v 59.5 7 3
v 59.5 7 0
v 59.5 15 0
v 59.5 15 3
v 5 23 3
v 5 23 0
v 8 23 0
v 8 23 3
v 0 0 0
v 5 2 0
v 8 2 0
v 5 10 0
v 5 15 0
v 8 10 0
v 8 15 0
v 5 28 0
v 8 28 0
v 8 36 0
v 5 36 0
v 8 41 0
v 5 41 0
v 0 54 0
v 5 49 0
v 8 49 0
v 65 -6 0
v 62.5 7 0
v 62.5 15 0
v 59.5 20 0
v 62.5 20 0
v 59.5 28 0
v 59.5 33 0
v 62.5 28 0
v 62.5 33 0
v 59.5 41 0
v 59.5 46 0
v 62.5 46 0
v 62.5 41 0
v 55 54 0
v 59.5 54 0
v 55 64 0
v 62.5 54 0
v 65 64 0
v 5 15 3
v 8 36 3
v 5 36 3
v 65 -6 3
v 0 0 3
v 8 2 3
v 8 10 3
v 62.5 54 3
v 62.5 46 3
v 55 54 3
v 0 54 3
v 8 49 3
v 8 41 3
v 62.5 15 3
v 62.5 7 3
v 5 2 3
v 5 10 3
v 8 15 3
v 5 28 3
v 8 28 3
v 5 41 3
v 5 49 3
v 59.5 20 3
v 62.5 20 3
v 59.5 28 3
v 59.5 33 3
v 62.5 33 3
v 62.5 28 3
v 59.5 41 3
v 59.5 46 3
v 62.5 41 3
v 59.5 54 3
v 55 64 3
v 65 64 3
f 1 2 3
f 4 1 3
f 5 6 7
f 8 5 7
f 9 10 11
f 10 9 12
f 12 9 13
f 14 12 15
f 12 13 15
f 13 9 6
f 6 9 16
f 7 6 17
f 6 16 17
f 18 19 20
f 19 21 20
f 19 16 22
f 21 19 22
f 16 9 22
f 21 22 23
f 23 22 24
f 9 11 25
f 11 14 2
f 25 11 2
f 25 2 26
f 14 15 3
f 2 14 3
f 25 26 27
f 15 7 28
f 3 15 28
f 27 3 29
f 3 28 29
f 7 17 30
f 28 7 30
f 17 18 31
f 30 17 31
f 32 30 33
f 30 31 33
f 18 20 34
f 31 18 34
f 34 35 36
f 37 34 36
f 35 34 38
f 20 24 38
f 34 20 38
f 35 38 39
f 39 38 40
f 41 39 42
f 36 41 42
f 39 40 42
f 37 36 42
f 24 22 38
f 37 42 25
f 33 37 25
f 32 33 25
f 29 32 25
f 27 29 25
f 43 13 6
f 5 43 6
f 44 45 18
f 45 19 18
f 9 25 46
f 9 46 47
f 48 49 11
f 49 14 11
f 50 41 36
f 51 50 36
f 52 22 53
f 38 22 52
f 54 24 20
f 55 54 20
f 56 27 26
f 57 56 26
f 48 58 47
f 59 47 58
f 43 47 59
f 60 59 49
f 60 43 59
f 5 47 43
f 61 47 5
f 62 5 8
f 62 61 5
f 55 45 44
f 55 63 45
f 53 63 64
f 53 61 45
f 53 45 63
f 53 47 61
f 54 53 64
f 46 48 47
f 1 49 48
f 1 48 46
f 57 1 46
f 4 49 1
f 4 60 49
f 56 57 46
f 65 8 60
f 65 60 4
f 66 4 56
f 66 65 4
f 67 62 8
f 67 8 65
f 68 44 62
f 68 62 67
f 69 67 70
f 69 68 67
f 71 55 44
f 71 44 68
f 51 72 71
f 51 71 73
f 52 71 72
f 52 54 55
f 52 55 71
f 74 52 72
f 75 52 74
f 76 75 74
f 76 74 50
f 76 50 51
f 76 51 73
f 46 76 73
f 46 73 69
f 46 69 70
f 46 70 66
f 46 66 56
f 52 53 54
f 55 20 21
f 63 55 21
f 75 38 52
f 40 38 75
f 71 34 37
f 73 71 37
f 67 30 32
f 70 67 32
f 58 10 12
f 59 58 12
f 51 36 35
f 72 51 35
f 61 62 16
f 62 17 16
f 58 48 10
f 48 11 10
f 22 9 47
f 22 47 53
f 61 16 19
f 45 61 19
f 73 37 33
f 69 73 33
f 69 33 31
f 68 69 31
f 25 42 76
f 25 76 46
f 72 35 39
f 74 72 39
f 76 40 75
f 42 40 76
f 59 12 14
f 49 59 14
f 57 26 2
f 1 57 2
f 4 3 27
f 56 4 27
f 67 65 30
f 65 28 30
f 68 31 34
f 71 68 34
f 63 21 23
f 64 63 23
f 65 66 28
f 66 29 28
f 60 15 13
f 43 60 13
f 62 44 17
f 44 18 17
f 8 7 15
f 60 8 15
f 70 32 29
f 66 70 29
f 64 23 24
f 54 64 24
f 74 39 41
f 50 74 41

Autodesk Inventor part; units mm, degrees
ref_plane "YZ Plane" through (0, 0, 0) normal (1, 0, 0) x (0, 1, 0)
ref_plane "XZ Plane" through (0, 0, 0) normal (0, 1, 0) x (-1, 0, 0)
ref_plane "XY Plane" through (0, 0, 0) normal (0, 0, 1) x (1, 0, 0)
sketch "Sketch1" plane through (0, 0, 0) normal (0, 0, 1) x (1, 0, 0)
  line L0 (0, 0) -> (0, 54)
  line L1 (0, 54) -> (55, 54)
  line L2 (55, 54) -> (55, 64)
  line L3 (55, 64) -> (65, 64)
  line L4 (65, 64) -> (65, -6)
  line L5 (65, -6) -> (0, 0)
  line L6 (5, 49) -> (8, 49)
  line L7 (8, 49) -> (8, 41)
  line L8 (8, 41) -> (5, 41)
  line L9 (5, 41) -> (5, 49)
  line L10 (5, 36) -> (8, 36)
  line L11 (8, 36) -> (8, 28)
  line L12 (8, 28) -> (5, 28)
  line L13 (5, 28) -> (5, 36)
  line L14 (5, 23) -> (8, 23)
  line L15 (8, 23) -> (8, 15)
  line L16 (8, 15) -> (5, 15)
  line L17 (5, 15) -> (5, 23)
  line L18 (5, 10) -> (8, 10)
  line L19 (8, 10) -> (8, 2)
  line L20 (8, 2) -> (5, 2)
  line L21 (5, 2) -> (5, 10)
  line L22 (59.5, 54) -> (62.5, 54)
  line L23 (62.5, 54) -> (62.5, 46)
  line L24 (62.5, 46) -> (59.5, 46)
  line L25 (59.5, 46) -> (59.5, 54)
  line L26 (59.5, 41) -> (62.5, 41)
  line L27 (62.5, 41) -> (62.5, 33)
  line L28 (62.5, 33) -> (59.5, 33)
  line L29 (59.5, 33) -> (59.5, 41)
  line L30 (59.5, 28) -> (62.5, 28)
  line L31 (62.5, 28) -> (62.5, 20)
  line L32 (62.5, 20) -> (59.5, 20)
  line L33 (59.5, 20) -> (59.5, 28)
  line L34 (59.5, 15) -> (62.5, 15)
  line L35 (62.5, 15) -> (62.5, 7)
  line L36 (62.5, 7) -> (59.5, 7)
  line L37 (59.5, 7) -> (59.5, 15)
  point P0 (6.5, 49)
  point P1 (6.5, 36)
  point P2 (6.5, 23)
  point P3 (6.5, 10)
  point P4 (6.5, 41)
  point P5 (6.5, 28)
  point P6 (6.5, 15)
  point P7 (5, 6)
  point P8 (61, 54)
  point P9 (61, 41)
  point P10 (61, 28)
  point P11 (61, 15)
  point P12 (61, 46)
  point P13 (61, 33)
  point P14 (61, 20)
  point P15 (59.5, 11)
  point P16 (60, 64)
  point P17 (62.5, 37)
  dimension "d0" = 54
  dimension "d1" = 55
  dimension "d2" = 10
  dimension "d3" = 10
  dimension "d4" = 70
  dimension "d5" = 3
  dimension "d6" = 8
  dimension "d7" = 5
  dimension "d8" = 5
  dimension "d9" = 3
  dimension "d10" = 8
  dimension "d11" = 3
  dimension "d12" = 8
  dimension "d13" = 3
  dimension "d14" = 8
  dimension "d15" = 5
  dimension "d16" = 5
  dimension "d17" = 5
  dimension "d18" = 5
  dimension "d19" = 5
  dimension "d20" = 5
  dimension "d21" = 3
  dimension "d22" = 8
  dimension "d23" = 3
  dimension "d24" = 8
  dimension "d25" = 3
  dimension "d26" = 8
  dimension "d27" = 3
  dimension "d28" = 8
  dimension "d29" = 5
  dimension "d30" = 5
  dimension "d31" = 5
  dimension "d32" = 10
  dimension "d33" = 2.5
  dimension "d34" = 2.5
  dimension "d35" = 2.5
  dimension "d36" = 2.5
extrude "Extrusion1" add sketch "Sketch1" along normal blind 3
properties part number "support select pt 1"
